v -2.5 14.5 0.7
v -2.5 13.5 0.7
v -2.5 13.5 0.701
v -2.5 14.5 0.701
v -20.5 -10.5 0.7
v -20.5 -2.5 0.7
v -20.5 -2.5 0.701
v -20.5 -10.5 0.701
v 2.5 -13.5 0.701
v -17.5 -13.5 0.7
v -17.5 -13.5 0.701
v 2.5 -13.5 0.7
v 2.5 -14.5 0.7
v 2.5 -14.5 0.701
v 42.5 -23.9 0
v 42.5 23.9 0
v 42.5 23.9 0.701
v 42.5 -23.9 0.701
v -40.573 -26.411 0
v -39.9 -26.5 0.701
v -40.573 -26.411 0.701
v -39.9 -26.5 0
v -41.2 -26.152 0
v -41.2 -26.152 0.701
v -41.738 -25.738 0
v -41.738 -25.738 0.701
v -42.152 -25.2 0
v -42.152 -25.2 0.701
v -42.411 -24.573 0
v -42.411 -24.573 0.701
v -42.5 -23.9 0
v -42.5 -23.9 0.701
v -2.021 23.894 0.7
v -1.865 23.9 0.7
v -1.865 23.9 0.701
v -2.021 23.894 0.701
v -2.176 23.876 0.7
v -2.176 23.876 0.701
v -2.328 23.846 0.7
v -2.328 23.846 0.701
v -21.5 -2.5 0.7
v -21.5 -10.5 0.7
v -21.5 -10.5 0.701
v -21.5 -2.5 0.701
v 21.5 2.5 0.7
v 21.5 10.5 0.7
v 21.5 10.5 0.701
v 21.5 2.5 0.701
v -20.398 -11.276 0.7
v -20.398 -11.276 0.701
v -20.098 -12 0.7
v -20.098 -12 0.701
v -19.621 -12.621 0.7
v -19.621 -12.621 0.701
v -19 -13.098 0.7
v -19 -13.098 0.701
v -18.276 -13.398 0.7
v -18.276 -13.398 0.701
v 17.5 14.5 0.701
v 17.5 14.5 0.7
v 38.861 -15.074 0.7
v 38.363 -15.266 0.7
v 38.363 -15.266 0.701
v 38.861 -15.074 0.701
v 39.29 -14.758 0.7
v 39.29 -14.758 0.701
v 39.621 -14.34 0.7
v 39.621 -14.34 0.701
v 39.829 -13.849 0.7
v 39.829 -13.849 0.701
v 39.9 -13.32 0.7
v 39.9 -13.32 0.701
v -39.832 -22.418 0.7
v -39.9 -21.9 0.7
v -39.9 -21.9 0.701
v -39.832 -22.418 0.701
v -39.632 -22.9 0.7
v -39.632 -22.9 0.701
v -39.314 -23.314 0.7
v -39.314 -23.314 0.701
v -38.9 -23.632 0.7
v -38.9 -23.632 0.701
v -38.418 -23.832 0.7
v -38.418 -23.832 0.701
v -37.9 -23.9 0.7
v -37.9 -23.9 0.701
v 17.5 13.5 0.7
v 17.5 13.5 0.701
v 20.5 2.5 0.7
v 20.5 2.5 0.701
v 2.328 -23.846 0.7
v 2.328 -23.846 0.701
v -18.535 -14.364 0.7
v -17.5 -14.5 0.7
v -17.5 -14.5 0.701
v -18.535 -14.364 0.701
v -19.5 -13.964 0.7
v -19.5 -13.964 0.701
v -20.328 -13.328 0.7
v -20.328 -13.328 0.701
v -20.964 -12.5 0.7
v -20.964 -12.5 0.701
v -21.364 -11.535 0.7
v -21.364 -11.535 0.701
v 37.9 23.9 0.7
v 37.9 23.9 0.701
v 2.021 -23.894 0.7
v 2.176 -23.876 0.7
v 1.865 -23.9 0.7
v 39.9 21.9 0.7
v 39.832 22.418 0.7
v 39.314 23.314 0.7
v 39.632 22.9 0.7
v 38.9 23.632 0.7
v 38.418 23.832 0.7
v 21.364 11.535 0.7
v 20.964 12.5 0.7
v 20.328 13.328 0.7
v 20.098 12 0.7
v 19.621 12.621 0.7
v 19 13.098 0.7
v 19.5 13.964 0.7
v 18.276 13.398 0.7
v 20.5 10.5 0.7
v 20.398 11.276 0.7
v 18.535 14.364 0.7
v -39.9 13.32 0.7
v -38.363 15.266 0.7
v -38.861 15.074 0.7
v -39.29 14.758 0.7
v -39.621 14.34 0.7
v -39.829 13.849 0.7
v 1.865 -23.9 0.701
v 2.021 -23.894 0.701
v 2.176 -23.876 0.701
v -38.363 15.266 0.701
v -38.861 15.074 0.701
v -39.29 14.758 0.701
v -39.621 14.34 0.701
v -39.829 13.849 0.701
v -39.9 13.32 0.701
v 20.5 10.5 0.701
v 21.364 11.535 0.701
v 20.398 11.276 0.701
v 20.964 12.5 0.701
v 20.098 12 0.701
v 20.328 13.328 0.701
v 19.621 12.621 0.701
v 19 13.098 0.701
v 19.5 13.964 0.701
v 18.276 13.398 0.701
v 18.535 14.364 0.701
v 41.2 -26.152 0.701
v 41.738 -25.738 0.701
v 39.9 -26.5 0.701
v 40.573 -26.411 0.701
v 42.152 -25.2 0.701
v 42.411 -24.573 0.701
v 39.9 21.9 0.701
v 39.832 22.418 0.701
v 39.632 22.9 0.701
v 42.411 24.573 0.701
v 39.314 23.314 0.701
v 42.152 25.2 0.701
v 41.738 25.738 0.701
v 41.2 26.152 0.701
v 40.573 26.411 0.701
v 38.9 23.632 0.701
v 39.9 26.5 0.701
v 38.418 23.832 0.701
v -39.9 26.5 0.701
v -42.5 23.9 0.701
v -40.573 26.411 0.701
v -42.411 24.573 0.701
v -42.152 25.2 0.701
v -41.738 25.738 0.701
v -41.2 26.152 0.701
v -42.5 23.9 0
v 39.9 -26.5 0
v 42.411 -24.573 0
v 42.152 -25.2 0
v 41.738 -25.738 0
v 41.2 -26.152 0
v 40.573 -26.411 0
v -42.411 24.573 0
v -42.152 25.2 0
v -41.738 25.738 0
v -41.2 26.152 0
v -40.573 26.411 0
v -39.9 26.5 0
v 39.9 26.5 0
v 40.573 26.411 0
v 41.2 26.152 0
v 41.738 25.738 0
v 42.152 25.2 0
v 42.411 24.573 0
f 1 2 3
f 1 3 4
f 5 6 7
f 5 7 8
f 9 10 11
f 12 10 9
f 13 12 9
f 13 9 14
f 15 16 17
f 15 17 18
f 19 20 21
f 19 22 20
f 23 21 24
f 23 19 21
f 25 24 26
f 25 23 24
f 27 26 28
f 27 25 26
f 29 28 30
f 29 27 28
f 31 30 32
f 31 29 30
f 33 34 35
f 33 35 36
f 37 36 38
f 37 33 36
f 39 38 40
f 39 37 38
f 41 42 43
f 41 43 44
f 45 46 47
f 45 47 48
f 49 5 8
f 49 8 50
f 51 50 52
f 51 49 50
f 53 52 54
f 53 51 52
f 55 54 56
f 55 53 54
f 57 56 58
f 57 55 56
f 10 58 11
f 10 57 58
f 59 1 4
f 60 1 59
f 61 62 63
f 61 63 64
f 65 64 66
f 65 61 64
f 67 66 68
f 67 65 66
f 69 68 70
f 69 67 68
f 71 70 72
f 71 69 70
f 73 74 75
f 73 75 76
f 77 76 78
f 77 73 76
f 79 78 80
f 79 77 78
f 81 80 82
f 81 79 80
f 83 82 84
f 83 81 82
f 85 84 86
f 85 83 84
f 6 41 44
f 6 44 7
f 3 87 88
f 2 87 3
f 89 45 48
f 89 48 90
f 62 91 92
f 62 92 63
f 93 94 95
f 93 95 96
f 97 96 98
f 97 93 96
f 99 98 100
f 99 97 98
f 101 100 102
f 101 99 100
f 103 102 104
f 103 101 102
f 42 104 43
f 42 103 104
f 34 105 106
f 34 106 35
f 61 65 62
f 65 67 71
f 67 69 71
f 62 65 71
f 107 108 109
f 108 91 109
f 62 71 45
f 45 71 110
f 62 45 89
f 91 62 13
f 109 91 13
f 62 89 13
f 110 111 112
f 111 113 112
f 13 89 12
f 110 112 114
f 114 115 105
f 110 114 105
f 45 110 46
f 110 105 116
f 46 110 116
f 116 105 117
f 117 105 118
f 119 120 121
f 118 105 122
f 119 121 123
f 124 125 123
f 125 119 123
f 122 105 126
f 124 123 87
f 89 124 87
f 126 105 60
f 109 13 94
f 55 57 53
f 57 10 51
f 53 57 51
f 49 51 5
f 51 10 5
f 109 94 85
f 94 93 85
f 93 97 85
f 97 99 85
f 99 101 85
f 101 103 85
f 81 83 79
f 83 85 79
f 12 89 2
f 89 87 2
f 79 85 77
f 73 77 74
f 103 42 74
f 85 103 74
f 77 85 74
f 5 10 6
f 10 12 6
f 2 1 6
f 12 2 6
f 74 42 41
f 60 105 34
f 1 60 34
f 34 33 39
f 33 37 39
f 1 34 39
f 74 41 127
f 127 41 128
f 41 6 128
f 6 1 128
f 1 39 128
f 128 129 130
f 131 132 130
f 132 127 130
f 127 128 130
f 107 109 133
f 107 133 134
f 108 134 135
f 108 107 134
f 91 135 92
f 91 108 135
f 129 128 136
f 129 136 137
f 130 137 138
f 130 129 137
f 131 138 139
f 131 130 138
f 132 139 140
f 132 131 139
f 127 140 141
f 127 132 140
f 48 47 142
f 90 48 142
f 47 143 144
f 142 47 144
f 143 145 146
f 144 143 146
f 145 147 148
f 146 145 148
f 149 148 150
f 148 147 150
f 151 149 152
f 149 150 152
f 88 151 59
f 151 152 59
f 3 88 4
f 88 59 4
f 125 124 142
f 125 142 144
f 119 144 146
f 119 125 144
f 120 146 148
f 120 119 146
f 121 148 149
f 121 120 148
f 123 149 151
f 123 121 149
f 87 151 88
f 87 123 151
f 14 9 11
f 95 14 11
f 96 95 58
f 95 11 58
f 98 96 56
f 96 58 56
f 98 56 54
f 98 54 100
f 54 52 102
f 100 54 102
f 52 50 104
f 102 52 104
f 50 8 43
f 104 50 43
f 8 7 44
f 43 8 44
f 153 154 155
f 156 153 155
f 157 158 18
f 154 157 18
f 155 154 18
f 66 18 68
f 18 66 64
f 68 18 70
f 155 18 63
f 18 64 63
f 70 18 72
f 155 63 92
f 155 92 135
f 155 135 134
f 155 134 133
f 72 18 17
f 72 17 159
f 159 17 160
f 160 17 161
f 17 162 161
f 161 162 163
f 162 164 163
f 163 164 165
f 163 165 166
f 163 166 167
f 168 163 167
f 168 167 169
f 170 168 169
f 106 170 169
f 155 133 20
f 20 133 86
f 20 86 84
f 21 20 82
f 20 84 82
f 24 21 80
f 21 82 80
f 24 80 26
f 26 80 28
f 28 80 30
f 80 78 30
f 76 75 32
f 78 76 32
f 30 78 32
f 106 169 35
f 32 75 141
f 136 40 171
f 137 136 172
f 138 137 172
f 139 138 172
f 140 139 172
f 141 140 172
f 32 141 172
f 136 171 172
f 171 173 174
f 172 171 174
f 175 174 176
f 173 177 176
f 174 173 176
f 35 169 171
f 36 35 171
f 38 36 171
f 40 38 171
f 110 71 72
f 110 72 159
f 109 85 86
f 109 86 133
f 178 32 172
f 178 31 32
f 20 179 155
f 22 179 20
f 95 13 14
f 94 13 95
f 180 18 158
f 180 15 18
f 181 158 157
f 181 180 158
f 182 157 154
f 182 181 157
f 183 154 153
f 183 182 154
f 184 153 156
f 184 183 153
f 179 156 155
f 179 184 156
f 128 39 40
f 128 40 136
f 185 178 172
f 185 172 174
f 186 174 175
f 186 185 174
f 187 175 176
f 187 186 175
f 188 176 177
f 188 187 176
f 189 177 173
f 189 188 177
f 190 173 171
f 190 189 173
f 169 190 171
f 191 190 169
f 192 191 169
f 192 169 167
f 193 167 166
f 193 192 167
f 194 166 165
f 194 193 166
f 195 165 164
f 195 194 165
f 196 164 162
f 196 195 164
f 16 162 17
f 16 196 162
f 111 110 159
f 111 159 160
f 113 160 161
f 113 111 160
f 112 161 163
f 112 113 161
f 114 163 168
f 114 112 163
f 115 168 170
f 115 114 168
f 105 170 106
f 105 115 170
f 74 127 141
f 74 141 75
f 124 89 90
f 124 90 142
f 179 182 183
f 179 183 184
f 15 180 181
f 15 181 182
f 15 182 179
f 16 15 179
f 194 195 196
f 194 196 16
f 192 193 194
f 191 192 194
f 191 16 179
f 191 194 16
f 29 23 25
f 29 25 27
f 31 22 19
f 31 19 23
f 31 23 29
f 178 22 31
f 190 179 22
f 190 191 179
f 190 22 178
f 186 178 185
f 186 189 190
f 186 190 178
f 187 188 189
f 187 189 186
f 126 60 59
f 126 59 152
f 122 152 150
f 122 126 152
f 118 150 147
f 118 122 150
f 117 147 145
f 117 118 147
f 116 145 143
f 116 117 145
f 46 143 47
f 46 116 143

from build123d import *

# Parameters (mm, degrees)
EXTRUDE_1_DEPTH = 0.7
EXTRUDE_2_DEPTH = 0.001
EXTRUDE_5_DEPTH = 0.001


with BuildPart() as part:
    # Эскиз1 → Бобышка-Вытянуть1 (new body)
    with BuildSketch(Plane.XY):
        with BuildLine():
            Line((-39.9, 26.5), (39.9, 26.5))
            ThreePointArc((39.9, 26.5), (41.738477631, 25.738477631), (42.5, 23.9))
            Line((42.5, 23.9), (42.5, -23.9))
            ThreePointArc((42.5, -23.9), (41.738477631, -25.738477631), (39.9, -26.5))
            Line((39.9, -26.5), (-39.9, -26.5))
            ThreePointArc((-39.9, -26.5), (-41.738477631, -25.738477631), (-42.5, -23.9))
            Line((-42.5, -23.9), (-42.5, 23.9))
            ThreePointArc((-42.5, 23.9), (-41.738477631, 25.738477631), (-39.9, 26.5))
        make_face()
    extrude(amount=EXTRUDE_1_DEPTH)

    # Эскиз2 → Бобышка-Вытянуть2 (add)
    with BuildSketch(Plane.XY.offset(0.7)):
        with BuildLine():
            Line((-42.5, -23.9), (-42.5, 23.9))
            ThreePointArc((-42.5, 23.9), (-41.738477631, 25.738477631), (-39.9, 26.5))
            Line((-39.9, 26.5), (39.9, 26.5))
            ThreePointArc((39.9, 26.5), (41.738477631, 25.738477631), (42.5, 23.9))
            Line((42.5, 23.9), (42.5, -23.9))
            ThreePointArc((42.5, -23.9), (41.738477631, -25.738477631), (39.9, -26.5))
            Line((39.9, -26.5), (-39.9, -26.5))
            ThreePointArc((-39.9, -26.5), (-41.738477631, -25.738477631), (-42.5, -23.9))
        make_face()
        with BuildLine():
            Line((37.9, 23.9), (-1.865186742, 23.9))
            ThreePointArc((-1.865186742, 23.9), (-2.098398171, 23.886356572), (-2.328427797, 23.845612429))
            Line((-2.328427797, 23.845612429), (-38.363241055, 15.265894987))
            ThreePointArc((-38.363241055, 15.265894987), (-39.469471585, 14.559943376), (-39.9, 13.320282558))
            Line((-39.9, 13.320282558), (-39.9, -21.9))
            ThreePointArc((-39.9, -21.9), (-39.314213562, -23.314213562), (-37.9, -23.9))
            Line((-37.9, -23.9), (1.865186742, -23.9))
            ThreePointArc((1.865186742, -23.9), (2.098398171, -23.886356572), (2.328427797, -23.845612429))
            Line((2.328427797, -23.845612429), (38.363241055, -15.265894987))
            ThreePointArc((38.363241055, -15.265894987), (39.469471585, -14.559943376), (39.9, -13.320282558))
            Line((39.9, -13.320282558), (39.9, 21.9))
            ThreePointArc((39.9, 21.9), (39.314213562, 23.314213562), (37.9, 23.9))
        make_face(mode=Mode.SUBTRACT)
    extrude(amount=EXTRUDE_2_DEPTH)

    # Эскиз11 → Бобышка-Вытянуть5 (add)
    with BuildSketch(Plane.XY.offset(0.7)):
        with BuildLine():
            Line((-17.5, -13.5), (2.5, -13.5))
            Line((2.5, -13.5), (2.5, -14.5))
            Line((2.5, -14.5), (-17.5, -14.5))
            ThreePointArc((-17.5, -14.5), (-20.328427125, -13.328427125), (-21.5, -10.5))
            Line((-21.5, -10.5), (-21.5, -2.5))
            Line((-21.5, -2.5), (-20.5, -2.5))
            Line((-20.5, -2.5), (-20.5, -10.5))
            ThreePointArc((-20.5, -10.5), (-19.621320344, -12.621320344), (-17.5, -13.5))
        make_face()
        with BuildLine():
            Line((17.5, 13.5), (-2.5, 13.5))
            Line((-2.5, 13.5), (-2.5, 14.5))
            Line((-2.5, 14.5), (17.5, 14.5))
            ThreePointArc((17.5, 14.5), (20.328427125, 13.328427125), (21.5, 10.5))
            Line((21.5, 10.5), (21.5, 2.5))
            Line((21.5, 2.5), (20.5, 2.5))
            Line((20.5, 2.5), (20.5, 10.5))
            ThreePointArc((20.5, 10.5), (19.621320344, 12.621320344), (17.5, 13.5))
        make_face()
    extrude(amount=EXTRUDE_5_DEPTH)


solid = part.part
